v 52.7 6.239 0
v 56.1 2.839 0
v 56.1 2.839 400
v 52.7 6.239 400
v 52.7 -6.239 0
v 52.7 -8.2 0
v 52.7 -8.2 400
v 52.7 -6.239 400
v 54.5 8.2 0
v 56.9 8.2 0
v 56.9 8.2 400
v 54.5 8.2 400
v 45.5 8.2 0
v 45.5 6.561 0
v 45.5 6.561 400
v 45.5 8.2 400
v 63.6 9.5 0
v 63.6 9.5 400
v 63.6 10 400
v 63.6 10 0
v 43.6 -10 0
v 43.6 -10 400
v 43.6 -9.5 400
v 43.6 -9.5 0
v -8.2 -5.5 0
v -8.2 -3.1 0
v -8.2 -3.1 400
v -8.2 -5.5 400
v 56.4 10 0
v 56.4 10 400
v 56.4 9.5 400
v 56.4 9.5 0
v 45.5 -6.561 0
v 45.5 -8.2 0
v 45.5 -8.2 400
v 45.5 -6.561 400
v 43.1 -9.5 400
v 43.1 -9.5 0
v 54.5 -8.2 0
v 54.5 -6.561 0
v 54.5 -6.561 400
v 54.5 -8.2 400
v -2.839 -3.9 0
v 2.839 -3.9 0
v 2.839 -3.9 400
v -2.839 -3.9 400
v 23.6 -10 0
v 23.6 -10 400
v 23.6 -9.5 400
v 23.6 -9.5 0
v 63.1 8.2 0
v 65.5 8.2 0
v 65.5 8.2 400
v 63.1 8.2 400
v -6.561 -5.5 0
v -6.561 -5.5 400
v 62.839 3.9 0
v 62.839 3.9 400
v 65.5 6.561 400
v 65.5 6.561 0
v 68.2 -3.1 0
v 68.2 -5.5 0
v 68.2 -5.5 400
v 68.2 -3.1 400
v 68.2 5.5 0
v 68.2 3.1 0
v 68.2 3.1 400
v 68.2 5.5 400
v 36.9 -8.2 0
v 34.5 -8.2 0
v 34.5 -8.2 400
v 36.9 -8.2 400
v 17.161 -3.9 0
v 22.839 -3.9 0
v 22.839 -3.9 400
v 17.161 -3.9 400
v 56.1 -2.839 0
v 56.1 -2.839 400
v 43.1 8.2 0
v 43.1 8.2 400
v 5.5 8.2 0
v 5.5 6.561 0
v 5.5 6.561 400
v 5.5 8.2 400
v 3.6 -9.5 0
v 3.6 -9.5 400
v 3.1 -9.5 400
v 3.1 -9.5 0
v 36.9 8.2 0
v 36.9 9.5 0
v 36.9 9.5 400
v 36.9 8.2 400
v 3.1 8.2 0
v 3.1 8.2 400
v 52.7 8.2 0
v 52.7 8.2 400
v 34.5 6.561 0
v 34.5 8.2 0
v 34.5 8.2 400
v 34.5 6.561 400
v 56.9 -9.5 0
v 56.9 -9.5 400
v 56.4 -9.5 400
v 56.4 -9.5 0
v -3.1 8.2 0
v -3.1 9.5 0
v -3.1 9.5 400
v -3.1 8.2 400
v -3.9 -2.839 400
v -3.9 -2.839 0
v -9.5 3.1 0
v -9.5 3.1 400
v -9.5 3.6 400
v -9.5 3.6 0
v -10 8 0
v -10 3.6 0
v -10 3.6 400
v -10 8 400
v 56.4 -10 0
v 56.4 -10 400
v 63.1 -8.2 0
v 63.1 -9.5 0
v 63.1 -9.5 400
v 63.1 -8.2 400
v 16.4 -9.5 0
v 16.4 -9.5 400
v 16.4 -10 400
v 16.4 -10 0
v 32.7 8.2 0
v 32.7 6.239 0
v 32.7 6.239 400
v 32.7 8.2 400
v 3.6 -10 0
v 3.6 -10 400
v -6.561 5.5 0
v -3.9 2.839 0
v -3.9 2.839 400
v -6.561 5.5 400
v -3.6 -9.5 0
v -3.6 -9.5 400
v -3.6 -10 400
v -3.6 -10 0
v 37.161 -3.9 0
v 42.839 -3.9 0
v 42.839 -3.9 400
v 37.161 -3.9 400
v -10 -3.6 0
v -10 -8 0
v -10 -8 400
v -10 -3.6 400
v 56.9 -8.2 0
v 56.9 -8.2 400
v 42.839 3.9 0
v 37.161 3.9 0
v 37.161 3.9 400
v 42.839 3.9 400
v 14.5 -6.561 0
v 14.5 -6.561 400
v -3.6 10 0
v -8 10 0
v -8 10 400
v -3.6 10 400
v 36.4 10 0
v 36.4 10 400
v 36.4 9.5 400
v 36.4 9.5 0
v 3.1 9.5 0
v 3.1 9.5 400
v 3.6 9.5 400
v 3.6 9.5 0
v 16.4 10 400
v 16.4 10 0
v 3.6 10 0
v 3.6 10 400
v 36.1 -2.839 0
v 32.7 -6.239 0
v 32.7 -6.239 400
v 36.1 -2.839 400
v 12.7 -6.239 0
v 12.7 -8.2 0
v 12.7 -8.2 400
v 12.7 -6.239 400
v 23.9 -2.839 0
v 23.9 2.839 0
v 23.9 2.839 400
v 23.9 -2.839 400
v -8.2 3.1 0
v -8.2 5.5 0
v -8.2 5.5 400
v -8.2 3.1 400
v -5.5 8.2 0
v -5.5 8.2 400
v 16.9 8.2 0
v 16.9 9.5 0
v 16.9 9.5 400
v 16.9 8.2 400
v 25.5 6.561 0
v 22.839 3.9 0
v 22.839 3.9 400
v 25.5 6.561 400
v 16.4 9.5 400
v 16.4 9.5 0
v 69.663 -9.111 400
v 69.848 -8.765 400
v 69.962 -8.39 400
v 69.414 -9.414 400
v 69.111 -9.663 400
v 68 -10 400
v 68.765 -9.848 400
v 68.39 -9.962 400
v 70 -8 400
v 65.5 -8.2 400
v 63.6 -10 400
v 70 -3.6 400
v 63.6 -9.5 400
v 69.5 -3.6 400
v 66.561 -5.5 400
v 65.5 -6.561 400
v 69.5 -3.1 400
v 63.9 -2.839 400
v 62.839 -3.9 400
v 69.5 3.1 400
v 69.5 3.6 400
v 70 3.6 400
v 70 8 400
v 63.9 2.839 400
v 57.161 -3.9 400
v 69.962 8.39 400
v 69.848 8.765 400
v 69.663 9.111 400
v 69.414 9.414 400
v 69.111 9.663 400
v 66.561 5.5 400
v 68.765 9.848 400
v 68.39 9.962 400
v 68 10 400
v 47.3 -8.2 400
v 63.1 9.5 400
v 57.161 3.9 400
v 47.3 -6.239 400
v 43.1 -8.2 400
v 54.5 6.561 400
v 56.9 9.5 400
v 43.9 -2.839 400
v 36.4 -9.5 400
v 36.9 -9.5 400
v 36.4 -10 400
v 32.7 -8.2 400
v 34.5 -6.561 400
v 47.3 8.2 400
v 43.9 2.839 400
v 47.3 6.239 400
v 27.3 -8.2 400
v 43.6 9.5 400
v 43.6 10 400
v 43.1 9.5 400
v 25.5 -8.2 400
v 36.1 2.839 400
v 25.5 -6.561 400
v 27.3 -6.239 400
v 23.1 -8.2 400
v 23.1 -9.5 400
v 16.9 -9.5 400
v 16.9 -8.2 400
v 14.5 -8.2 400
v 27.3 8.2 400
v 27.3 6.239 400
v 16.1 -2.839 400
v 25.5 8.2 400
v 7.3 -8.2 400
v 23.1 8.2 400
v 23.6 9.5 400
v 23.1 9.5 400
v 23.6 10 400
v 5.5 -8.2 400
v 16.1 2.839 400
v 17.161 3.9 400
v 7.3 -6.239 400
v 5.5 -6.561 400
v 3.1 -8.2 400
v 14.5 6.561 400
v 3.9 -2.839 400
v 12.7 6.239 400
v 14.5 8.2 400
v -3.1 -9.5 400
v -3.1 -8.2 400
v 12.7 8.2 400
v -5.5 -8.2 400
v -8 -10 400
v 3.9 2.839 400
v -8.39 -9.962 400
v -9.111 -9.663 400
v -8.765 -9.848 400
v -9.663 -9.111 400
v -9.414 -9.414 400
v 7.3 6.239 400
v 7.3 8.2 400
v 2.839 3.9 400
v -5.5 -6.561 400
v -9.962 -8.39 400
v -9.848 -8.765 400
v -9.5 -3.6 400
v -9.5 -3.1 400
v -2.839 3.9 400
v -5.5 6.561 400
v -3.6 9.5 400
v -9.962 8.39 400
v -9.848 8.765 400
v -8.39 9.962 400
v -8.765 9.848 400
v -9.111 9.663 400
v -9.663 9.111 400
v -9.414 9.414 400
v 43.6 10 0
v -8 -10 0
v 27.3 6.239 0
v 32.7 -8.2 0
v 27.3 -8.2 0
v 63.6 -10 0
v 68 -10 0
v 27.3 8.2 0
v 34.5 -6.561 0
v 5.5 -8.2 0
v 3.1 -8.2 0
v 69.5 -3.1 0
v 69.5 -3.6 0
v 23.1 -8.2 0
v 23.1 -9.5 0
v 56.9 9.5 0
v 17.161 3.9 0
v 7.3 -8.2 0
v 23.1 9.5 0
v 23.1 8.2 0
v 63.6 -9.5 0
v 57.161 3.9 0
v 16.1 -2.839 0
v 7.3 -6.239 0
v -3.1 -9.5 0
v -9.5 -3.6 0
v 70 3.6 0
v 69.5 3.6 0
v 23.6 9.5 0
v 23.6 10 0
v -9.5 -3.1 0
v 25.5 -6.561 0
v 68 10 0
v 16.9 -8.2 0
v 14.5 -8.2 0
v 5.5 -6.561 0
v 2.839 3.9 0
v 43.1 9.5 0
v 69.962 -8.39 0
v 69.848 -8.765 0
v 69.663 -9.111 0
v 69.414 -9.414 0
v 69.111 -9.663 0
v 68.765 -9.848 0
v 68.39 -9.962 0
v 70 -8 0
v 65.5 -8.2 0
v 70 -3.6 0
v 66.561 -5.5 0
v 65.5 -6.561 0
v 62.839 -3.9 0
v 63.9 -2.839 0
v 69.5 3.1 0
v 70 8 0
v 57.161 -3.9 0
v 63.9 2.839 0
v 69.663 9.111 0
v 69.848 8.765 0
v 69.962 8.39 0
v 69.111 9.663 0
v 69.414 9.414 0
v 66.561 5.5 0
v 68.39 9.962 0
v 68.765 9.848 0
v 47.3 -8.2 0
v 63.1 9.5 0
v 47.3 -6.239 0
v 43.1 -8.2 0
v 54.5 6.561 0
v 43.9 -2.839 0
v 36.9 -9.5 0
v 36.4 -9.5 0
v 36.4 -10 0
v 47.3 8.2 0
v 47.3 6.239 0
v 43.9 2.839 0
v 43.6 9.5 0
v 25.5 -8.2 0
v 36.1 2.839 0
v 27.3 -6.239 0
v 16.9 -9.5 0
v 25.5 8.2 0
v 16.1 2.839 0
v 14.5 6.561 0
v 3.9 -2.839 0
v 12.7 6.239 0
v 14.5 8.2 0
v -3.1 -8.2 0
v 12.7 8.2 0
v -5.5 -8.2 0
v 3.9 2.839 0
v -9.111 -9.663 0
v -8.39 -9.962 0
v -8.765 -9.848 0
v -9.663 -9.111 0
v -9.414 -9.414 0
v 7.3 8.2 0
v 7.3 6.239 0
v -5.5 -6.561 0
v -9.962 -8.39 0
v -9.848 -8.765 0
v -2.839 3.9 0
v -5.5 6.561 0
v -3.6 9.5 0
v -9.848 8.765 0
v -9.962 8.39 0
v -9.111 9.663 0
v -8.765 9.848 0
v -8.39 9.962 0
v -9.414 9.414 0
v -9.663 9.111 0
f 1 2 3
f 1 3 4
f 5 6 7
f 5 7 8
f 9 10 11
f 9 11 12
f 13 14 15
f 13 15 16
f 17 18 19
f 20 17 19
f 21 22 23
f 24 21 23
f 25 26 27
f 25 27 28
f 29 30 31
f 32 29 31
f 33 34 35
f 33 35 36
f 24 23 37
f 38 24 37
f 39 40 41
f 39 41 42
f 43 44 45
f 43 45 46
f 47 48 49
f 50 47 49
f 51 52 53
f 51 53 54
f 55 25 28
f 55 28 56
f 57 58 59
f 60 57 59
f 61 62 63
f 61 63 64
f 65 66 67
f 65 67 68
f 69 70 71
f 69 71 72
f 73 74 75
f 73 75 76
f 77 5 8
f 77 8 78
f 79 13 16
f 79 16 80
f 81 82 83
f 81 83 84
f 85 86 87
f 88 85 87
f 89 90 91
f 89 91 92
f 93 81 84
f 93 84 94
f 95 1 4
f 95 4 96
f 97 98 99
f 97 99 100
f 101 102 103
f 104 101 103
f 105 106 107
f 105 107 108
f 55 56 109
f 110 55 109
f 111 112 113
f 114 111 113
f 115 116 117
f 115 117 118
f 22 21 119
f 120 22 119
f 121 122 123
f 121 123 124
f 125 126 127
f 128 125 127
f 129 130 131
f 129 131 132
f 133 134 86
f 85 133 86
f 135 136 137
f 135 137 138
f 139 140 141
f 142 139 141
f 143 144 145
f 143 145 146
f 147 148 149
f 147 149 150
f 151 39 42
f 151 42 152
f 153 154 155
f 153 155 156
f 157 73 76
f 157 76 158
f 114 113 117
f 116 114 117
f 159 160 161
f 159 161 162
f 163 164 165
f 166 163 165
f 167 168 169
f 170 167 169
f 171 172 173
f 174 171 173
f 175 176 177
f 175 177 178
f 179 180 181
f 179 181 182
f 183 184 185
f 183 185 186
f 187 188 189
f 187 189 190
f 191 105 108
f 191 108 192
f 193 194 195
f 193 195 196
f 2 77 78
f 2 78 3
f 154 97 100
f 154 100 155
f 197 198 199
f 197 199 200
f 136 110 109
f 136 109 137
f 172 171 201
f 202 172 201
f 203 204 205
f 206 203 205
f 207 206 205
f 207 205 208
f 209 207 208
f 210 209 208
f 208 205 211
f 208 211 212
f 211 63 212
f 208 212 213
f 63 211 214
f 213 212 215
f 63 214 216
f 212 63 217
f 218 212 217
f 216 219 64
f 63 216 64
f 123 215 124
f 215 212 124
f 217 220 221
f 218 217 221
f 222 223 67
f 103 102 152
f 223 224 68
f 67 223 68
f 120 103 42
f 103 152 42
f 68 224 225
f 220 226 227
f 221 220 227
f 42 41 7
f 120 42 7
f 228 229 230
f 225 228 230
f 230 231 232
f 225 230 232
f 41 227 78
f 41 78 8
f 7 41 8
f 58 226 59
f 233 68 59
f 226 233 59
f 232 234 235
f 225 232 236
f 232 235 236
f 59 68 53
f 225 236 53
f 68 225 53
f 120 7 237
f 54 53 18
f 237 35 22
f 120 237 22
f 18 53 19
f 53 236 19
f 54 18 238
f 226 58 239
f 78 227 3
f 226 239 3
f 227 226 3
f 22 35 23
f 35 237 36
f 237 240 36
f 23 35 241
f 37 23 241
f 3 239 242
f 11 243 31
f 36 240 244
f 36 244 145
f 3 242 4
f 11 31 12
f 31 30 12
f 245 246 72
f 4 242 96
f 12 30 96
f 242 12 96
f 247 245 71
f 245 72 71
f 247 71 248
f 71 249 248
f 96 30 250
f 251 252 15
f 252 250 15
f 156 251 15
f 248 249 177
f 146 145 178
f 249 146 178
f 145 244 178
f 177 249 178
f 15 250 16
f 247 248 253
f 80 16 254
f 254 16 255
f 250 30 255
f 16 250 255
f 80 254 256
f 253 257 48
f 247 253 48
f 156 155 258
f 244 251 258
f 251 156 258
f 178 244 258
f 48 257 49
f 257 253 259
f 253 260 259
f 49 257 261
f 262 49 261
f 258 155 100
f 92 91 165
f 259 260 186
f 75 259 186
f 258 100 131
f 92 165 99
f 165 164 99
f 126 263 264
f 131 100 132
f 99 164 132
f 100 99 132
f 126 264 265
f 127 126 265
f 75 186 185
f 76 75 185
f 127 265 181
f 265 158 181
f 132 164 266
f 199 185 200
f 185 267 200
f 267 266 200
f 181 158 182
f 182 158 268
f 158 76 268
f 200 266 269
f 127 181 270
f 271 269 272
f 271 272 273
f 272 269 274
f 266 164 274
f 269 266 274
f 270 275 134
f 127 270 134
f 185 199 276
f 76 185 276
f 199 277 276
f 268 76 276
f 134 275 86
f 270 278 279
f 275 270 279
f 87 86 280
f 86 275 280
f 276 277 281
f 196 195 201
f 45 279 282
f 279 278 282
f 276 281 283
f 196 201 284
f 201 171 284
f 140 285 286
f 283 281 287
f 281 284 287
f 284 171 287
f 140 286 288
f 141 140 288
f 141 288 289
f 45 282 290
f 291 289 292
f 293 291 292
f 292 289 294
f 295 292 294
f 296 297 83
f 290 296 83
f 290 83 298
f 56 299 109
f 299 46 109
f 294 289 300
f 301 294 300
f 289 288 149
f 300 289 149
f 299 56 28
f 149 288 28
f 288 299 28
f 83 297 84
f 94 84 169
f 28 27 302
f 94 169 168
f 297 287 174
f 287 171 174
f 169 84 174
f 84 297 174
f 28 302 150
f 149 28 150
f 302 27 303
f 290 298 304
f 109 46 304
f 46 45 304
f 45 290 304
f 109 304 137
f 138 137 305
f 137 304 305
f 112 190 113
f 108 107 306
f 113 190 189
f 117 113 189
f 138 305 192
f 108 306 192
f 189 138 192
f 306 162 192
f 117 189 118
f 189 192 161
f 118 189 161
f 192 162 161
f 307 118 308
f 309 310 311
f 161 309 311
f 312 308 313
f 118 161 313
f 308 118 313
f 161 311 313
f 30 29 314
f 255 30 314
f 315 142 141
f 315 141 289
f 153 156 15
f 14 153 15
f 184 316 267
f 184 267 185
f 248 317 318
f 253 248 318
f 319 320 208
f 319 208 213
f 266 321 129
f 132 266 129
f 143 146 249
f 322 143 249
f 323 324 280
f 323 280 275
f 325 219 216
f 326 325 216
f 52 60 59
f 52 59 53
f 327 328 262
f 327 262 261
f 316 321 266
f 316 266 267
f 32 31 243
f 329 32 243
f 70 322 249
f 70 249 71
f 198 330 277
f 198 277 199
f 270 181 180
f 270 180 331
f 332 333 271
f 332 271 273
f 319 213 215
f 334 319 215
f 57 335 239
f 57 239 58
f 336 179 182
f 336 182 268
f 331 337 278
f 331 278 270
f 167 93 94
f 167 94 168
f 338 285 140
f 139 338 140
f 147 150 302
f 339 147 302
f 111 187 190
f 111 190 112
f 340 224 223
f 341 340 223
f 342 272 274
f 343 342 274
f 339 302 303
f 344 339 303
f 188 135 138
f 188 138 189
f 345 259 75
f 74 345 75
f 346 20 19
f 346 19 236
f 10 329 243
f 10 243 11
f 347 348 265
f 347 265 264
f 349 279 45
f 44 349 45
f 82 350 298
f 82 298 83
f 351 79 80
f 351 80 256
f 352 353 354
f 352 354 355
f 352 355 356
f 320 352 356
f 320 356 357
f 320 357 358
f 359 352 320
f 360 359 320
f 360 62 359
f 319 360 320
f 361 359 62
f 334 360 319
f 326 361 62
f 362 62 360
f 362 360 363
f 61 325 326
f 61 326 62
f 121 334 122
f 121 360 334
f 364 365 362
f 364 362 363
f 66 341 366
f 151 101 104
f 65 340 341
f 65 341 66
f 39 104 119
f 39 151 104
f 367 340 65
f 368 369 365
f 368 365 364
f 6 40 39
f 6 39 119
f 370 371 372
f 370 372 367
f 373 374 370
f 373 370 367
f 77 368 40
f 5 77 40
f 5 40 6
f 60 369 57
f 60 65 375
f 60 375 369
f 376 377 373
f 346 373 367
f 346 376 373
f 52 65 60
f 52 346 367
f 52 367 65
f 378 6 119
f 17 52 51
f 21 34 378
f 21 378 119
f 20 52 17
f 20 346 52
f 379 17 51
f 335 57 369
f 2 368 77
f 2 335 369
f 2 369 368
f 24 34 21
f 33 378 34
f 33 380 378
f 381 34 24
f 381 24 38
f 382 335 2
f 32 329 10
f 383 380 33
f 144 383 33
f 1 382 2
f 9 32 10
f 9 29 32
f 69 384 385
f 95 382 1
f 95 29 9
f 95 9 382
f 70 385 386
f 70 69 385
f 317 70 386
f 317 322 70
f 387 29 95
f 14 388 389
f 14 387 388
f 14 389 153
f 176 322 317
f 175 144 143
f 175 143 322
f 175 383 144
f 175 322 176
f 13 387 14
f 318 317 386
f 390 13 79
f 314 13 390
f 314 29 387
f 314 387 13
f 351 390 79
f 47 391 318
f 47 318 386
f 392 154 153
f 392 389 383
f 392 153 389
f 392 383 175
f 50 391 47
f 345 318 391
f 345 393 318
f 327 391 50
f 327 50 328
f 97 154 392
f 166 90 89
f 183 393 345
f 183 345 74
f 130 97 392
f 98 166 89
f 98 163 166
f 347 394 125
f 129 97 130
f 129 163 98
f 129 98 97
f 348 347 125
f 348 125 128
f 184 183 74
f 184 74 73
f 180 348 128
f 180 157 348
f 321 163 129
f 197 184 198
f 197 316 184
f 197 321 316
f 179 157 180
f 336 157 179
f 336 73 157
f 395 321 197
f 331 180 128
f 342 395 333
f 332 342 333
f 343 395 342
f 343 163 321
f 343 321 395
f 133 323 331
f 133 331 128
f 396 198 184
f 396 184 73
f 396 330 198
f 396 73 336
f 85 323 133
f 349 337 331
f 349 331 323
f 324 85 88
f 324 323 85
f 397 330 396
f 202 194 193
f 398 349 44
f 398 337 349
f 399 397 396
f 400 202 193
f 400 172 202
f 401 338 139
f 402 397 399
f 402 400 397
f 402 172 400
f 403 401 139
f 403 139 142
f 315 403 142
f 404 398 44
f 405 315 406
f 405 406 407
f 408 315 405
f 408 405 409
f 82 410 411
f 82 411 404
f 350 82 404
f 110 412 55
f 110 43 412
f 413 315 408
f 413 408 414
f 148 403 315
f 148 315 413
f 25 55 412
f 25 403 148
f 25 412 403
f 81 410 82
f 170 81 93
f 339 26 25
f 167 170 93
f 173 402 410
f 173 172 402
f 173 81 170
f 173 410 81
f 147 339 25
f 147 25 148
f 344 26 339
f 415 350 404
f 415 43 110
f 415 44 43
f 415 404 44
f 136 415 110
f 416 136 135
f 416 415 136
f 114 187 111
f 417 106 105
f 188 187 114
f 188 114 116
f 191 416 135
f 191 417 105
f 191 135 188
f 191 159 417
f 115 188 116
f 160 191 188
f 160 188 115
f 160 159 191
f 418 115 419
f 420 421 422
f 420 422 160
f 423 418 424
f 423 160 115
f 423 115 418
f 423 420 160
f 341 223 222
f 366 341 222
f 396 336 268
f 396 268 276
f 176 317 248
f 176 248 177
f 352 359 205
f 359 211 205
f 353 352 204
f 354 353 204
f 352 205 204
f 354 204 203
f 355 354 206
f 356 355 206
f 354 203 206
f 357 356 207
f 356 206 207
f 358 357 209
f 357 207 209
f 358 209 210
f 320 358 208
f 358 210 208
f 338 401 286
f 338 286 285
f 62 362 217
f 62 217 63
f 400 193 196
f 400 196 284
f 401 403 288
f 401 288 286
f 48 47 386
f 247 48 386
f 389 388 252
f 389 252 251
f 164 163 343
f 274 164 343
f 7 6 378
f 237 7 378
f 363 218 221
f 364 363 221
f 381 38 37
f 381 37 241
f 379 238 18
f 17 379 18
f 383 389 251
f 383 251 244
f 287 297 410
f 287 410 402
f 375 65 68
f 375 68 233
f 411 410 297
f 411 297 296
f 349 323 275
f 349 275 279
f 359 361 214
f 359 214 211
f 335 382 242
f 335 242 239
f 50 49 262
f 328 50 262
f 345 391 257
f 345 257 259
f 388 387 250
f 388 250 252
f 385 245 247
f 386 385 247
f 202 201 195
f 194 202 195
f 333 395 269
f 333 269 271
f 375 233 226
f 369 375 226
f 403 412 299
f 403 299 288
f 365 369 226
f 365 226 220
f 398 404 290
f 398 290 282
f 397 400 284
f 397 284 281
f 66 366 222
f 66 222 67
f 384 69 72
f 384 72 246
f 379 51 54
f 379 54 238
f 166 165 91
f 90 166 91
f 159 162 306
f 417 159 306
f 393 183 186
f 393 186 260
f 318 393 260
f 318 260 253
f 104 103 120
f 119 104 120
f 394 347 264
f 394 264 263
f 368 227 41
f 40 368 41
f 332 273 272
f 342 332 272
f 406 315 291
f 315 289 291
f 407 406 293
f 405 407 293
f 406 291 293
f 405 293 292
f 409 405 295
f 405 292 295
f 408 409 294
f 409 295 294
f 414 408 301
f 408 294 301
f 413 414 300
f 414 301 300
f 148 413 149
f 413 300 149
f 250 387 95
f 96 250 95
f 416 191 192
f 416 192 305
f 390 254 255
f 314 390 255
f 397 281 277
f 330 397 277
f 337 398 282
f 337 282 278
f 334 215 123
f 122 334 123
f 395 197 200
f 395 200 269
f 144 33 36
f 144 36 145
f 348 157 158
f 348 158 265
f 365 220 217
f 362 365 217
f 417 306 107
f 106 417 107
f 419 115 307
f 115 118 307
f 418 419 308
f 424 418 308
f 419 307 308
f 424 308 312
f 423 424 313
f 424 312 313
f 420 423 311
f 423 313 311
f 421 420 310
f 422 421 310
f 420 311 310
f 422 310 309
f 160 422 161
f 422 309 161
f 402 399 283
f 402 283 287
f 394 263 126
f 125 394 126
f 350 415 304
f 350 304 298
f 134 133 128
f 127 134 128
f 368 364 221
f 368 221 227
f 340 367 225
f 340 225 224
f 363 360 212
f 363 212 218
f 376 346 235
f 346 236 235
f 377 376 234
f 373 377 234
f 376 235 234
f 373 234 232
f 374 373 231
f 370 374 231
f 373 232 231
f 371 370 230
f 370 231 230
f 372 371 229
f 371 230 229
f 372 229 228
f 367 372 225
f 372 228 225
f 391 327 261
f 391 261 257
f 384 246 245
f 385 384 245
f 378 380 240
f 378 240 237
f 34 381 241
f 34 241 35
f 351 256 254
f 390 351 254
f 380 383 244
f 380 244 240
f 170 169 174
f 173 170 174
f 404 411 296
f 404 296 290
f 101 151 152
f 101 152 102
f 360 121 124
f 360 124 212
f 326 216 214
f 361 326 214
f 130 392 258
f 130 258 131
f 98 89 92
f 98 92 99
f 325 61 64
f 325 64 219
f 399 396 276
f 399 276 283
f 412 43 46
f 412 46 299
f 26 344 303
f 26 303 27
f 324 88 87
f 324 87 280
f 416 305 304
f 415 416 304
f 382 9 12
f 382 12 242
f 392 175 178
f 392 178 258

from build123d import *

# Parameters (mm, degrees)
EXTRUDE_1_DEPTH = 400
FILLET_1_R      = 2


with BuildPart() as part:
    # 草图1 → 凸台-拉伸1 (new body)
    with BuildSketch(Plane.XY):
        Polygon((-2.839339828, 3.9), (2.839339828, 3.9), (5.5, 6.560660172), (5.5, 8.2), (3.1, 8.2), (3.1, 9.5), (3.6, 9.5), (3.6, 10), (7.3, 10), (10, 10), (12.7, 10), (16.4, 10), (16.4, 9.5), (16.9, 9.5), (16.9, 8.2), (14.5, 8.2), (14.5, 6.560660172), (17.160660172, 3.9), (22.839339828, 3.9), (25.5, 6.560660172), (25.5, 8.2), (23.1, 8.2), (23.1, 9.5), (23.6, 9.5), (23.6, 10), (27.3, 10), (30, 10), (32.7, 10), (36.4, 10), (36.4, 9.5), (36.9, 9.5), (36.9, 8.2), (34.5, 8.2), (34.5, 6.560660172), (37.160660172, 3.9), (42.839339828, 3.9), (45.5, 6.560660172), (45.5, 8.2), (43.1, 8.2), (43.1, 9.5), (43.6, 9.5), (43.6, 10), (47.3, 10), (50, 10), (52.7, 10), (56.4, 10), (56.4, 9.5), (56.9, 9.5), (56.9, 8.2), (54.5, 8.2), (54.5, 6.560660172), (57.160660172, 3.9), (62.839339828, 3.9), (65.5, 6.560660172), (65.5, 8.2), (63.1, 8.2), (63.1, 9.5), (63.6, 9.5), (63.6, 10), (70, 10), (70, 3.6), (69.5, 3.6), (69.5, 3.1), (68.2, 3.1), (68.2, 5.5), (66.560660172, 5.5), (63.9, 2.839339828), (63.9, -2.839339828), (66.560660172, -5.5), (68.2, -5.5), (68.2, -3.1), (69.5, -3.1), (69.5, -3.6), (70, -3.6), (70, -10), (63.6, -10), (63.6, -9.5), (63.1, -9.5), (63.1, -8.2), (65.5, -8.2), (65.5, -6.560660172), (62.839339828, -3.9), (57.160660172, -3.9), (54.5, -6.560660172), (54.5, -8.2), (56.9, -8.2), (56.9, -9.5), (56.4, -9.5), (56.4, -10), (52.7, -10), (50, -10), (47.3, -10), (43.6, -10), (43.6, -9.5), (43.1, -9.5), (43.1, -8.2), (45.5, -8.2), (45.5, -6.560660172), (42.839339828, -3.9), (37.160660172, -3.9), (34.5, -6.560660172), (34.5, -8.2), (36.9, -8.2), (36.9, -9.5), (36.4, -9.5), (36.4, -10), (32.7, -10), (30, -10), (27.3, -10), (23.6, -10), (23.6, -9.5), (23.1, -9.5), (23.1, -8.2), (25.5, -8.2), (25.5, -6.560660172), (22.839339828, -3.9), (17.160660172, -3.9), (14.5, -6.560660172), (14.5, -8.2), (16.9, -8.2), (16.9, -9.5), (16.4, -9.5), (16.4, -10), (12.7, -10), (10, -10), (7.3, -10), (3.6, -10), (3.6, -9.5), (3.1, -9.5), (3.1, -8.2), (5.5, -8.2), (5.5, -6.560660172), (2.839339828, -3.9), (-2.839339828, -3.9), (-5.5, -6.560660172), (-5.5, -8.2), (-3.1, -8.2), (-3.1, -9.5), (-3.6, -9.5), (-3.6, -10), (-10, -10), (-10, -3.6), (-9.5, -3.6), (-9.5, -3.1), (-8.2, -3.1), (-8.2, -5.5), (-6.560660172, -5.5), (-3.9, -2.839339828), (-3.9, 2.839339828), (-6.560660172, 5.5), (-8.2, 5.5), (-8.2, 3.1), (-9.5, 3.1), (-9.5, 3.6), (-10, 3.6), (-10, 10), (-3.6, 10), (-3.6, 9.5), (-3.1, 9.5), (-3.1, 8.2), (-5.5, 8.2), (-5.5, 6.560660172), align=None)
        Polygon((3.9, 2.839339828), (3.9, -2.839339828), (7.3, -6.239339828), (7.3, -8.2), (10, -8.2), (12.7, -8.2), (12.7, -6.239339828), (16.1, -2.839339828), (16.1, 2.839339828), (12.7, 6.239339828), (12.7, 8.2), (10, 8.2), (7.3, 8.2), (7.3, 6.239339828), align=None, mode=Mode.SUBTRACT)
        Polygon((23.9, 2.839339828), (23.9, -2.839339828), (27.3, -6.239339828), (27.3, -8.2), (30, -8.2), (32.7, -8.2), (32.7, -6.239339828), (36.1, -2.839339828), (36.1, 2.839339828), (32.7, 6.239339828), (32.7, 8.2), (30, 8.2), (27.3, 8.2), (27.3, 6.239339828), align=None, mode=Mode.SUBTRACT)
        Polygon((43.9, 2.839339828), (43.9, -2.839339828), (47.3, -6.239339828), (47.3, -8.2), (50, -8.2), (52.7, -8.2), (52.7, -6.239339828), (56.1, -2.839339828), (56.1, 2.839339828), (52.7, 6.239339828), (52.7, 8.2), (50, 8.2), (47.3, 8.2), (47.3, 6.239339828), align=None, mode=Mode.SUBTRACT)
    extrude(amount=EXTRUDE_1_DEPTH)

    # 圆角1
    fillet_1_edges = [part.edges().sort_by_distance(p)[0] for p in [
        (-10, 10, 200),
        (70, 10, 200),
        (70, -10, 200),
        (-10, -10, 200),
    ]]
    fillet(fillet_1_edges, radius=FILLET_1_R)


solid = part.part
